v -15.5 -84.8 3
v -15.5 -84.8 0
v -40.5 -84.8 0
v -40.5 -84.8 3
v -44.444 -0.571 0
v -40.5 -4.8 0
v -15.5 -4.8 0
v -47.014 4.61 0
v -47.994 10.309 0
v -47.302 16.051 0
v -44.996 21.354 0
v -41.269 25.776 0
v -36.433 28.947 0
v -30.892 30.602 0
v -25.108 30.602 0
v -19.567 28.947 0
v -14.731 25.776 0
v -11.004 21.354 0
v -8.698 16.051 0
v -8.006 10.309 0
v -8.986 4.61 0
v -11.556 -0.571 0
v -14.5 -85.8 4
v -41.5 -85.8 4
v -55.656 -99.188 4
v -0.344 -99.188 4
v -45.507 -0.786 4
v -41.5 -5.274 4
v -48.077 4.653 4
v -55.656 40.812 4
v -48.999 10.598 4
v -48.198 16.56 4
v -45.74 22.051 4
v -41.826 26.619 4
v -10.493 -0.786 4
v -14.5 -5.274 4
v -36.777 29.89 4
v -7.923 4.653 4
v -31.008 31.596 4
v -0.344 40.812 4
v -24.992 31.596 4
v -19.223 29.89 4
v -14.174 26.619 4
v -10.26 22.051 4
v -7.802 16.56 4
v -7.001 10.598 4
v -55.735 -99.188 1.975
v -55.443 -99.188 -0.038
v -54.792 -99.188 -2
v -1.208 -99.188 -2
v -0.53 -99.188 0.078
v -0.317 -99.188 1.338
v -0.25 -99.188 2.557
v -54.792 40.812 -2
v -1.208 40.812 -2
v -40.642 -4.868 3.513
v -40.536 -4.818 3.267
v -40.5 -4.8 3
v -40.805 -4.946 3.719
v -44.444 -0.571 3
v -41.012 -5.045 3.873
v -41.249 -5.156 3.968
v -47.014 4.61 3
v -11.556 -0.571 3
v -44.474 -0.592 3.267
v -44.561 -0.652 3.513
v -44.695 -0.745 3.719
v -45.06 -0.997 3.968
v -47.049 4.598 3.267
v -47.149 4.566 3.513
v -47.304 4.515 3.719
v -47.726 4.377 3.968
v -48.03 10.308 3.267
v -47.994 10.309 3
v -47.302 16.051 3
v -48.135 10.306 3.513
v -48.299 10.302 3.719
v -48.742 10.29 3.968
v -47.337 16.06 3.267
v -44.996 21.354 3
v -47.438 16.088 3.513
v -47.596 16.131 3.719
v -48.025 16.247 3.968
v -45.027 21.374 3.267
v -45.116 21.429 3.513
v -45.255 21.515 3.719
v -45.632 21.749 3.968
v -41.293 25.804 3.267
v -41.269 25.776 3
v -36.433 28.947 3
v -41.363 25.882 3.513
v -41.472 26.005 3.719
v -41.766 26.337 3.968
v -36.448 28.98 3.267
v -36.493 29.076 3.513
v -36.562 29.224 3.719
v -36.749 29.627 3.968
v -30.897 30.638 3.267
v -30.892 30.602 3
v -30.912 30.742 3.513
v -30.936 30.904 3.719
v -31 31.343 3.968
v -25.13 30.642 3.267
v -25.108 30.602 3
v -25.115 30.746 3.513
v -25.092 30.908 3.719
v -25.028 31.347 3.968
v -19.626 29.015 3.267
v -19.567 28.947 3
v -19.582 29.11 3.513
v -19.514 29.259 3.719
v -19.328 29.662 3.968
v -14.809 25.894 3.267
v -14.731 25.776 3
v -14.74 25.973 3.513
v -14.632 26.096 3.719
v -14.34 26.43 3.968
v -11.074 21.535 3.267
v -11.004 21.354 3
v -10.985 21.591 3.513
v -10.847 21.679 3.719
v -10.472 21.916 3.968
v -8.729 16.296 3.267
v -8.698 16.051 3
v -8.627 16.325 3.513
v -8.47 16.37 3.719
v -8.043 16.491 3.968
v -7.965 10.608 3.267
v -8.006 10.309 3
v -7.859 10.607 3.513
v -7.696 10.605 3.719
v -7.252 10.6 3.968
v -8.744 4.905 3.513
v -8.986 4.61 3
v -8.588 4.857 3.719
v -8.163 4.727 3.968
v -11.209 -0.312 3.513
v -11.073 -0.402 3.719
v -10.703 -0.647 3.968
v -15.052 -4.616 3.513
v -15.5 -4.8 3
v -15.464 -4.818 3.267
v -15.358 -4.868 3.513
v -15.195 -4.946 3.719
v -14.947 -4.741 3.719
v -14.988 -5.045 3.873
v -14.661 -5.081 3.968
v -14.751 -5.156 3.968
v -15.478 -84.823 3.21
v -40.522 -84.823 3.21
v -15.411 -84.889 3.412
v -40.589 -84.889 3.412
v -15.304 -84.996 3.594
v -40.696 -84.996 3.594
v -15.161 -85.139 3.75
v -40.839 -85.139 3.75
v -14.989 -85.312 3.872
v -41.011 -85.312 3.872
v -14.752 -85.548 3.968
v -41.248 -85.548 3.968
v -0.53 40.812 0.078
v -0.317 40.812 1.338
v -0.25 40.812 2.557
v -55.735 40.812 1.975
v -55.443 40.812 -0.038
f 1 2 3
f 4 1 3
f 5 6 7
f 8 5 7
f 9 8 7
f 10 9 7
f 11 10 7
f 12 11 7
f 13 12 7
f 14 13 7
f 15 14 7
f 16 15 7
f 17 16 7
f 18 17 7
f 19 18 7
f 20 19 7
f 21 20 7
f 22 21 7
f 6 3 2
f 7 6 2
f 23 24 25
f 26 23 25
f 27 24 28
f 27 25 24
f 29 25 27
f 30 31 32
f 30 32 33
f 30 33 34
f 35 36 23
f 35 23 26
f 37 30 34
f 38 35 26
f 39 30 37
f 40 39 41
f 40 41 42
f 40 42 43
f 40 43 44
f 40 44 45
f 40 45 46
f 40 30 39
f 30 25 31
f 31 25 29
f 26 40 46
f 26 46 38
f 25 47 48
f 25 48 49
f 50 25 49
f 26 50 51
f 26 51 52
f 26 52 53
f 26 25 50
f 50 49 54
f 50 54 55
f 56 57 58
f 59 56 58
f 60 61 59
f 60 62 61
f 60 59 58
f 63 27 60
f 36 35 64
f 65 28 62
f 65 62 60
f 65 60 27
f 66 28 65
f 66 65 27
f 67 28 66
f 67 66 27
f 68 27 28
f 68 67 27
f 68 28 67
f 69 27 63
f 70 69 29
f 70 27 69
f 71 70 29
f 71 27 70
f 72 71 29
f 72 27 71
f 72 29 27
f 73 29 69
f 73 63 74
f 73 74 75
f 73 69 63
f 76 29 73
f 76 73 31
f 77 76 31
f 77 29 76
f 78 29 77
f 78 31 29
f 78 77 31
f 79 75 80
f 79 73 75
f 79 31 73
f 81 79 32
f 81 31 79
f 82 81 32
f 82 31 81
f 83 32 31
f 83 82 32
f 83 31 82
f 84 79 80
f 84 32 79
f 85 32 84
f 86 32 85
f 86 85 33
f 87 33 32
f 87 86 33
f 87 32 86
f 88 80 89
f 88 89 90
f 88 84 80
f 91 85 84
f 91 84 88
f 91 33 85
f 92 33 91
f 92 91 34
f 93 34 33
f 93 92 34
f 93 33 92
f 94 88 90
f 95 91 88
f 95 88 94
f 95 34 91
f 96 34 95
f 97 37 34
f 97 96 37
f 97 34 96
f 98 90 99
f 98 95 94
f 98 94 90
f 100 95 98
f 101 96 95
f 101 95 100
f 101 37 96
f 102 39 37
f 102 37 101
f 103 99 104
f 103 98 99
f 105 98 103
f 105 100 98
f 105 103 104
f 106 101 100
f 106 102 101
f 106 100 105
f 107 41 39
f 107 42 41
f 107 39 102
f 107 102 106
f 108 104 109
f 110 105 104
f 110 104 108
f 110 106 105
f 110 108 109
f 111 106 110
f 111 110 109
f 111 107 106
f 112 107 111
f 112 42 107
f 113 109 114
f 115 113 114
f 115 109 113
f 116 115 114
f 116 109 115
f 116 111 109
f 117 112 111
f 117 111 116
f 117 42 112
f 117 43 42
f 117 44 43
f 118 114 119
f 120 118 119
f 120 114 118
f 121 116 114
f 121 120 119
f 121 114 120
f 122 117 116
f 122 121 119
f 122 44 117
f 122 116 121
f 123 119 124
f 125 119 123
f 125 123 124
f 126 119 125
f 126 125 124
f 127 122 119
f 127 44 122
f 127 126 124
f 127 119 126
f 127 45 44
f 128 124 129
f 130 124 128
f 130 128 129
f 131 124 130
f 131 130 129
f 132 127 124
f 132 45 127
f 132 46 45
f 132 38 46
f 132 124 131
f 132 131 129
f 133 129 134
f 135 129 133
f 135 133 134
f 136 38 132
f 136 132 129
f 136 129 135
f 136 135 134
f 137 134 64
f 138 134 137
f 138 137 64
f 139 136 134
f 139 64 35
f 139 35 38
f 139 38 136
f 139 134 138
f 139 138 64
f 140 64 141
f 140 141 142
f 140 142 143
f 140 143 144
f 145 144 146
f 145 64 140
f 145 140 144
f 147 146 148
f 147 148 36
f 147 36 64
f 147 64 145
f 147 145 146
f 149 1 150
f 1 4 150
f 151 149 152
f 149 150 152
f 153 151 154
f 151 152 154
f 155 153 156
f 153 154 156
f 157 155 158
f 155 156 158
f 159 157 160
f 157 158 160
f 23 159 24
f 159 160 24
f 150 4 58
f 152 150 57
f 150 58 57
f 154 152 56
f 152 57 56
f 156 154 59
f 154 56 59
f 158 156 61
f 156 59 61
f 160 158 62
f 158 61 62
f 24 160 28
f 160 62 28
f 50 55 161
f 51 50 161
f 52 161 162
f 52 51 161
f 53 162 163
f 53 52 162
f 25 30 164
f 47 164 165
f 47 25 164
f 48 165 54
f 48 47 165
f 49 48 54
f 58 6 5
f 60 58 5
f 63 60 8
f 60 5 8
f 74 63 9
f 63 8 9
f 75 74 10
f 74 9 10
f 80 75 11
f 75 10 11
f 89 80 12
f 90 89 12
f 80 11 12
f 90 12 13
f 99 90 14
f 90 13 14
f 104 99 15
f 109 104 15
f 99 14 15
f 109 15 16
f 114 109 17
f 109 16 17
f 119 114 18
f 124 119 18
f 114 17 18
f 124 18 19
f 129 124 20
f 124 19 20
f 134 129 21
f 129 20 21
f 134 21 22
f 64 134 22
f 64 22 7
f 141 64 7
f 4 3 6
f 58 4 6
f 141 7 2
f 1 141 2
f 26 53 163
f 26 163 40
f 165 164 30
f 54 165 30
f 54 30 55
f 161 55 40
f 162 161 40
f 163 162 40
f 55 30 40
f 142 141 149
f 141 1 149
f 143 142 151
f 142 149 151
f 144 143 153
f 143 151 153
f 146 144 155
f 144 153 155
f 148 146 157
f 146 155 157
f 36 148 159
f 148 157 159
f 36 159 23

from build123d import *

# Parameters (mm, degrees)
F0_W     = 56
F0_H     = 140
F1_DEPTH = 4
F2_R     = 1
F3_W     = 56
F3_H     = 140
F4_DEPTH = 2
F6_DEPTH = 140


with BuildPart() as f1:
    # F0 (on Top) → F1 (new body)
    with BuildSketch(Plane.XY):
        with Locations((-28, -29.1878056526)):
            Rectangle(F0_W, F0_H)
        with BuildLine():
            ThreePointArc((-40.5, -4.8003006486), (-36.6602540378, 28.8399507247), (-8, 10.8121943474))
            ThreePointArc((-8, 10.8121943474), (-9.9722436227, 2.1519403095), (-15.5, -4.8003006486))
            Line((-15.5, -4.8003006486), (-15.5, -84.8003006486))
            Line((-15.5, -84.8003006486), (-40.5, -84.8003006486))
            Line((-40.5, -84.8003006486), (-40.5, -4.8003006486))
        make_face(mode=Mode.SUBTRACT)
    extrude(amount=F1_DEPTH)

    # F2
    f2_edges = [f1.edges().sort_by_distance(p)[0] for p in [
        (-36.660254, 28.839951, 4),
        (-28, -84.800301, 4),
        (-15.5, -44.800301, 4),
        (-40.5, -44.800301, 4),
    ]]
    fillet(f2_edges, radius=F2_R)

    # F3 (on face) → F4 (join)
    with BuildSketch(Plane(origin=(0, 0, 0), x_dir=(1, 0, 0), z_dir=(0, 0, -1))):
        with Locations((-28, 29.1878056526)):
            Rectangle(F3_W, F3_H)
    extrude(amount=F4_DEPTH)

    # F5 (on face) → F6 (cut)
    with BuildSketch(Plane.XZ.offset(99.1878056526)):
        with BuildLine():
            add(Edge.make_bspline(
                [(4.7167868723, 1.2952466803), (4.7335338345, 1.1579142358), (4.7907207583, 2.8268265821), (4.728835521, 3.7590862588), (4.550137161, 5.5569466999), (4.0878044752, 7.5497423615), (3.1530424566, 9.8821218174), (1.9056722615, 12.054913232), (0.3839834487, 14.0800693463), (-1.3922671666, 15.945478196), (-3.0668308786, 17.3457564736), (-4.5378930711, 18.4083876952), (-5.6986449343, 19.1776471354), (-6.9073685817, 19.9017205855), (-8.5528252486, 20.8065850146), (-10.6587895739, 21.8007860687), (-13.3265373851, 22.8031570282), (-16.0969822522, 23.6248737674), (-18.9575149764, 24.2714809671), (-21.896584676, 24.7375795115), (-24.3854542149, 24.9604081638), (-26.4386175024, 25.0485260723), (-28, 25.0734073731), (-29.5613824976, 25.0485260723), (-31.6145457851, 24.9604081638), (-34.103415324, 24.7375795116), (-37.0424850236, 24.2714809668), (-39.9030177479, 23.6248737687), (-42.6734626148, 22.8031570233), (-45.3412104266, 21.800786086), (-47.4471747498, 20.8065849594), (-49.0926314231, 19.9017207566), (-50.3013550503, 19.1776465923), (-51.4621069901, 18.4083898446), (-52.9331688432, 17.3457467095), (-54.607734032, 15.9455202527), (-56.3839785969, 14.0798990975), (-57.9056901102, 12.0555395434), (-59.1529762673, 9.8797992317), (-60.0880420615, 7.5580792781), (-60.5493701757, 5.5300331488), (-60.7312339418, 3.8432469623), (-60.7830452324, 2.5574920108), (-60.7312339418, 1.2717370592), (-60.5493701757, -0.4150491273), (-60.0880420615, -2.4430952566), (-59.1529762673, -4.7648152102), (-57.9056901102, -6.9405555219), (-56.3839785969, -8.964915076), (-54.607734032, -10.8305362311), (-52.9331688432, -12.230762688), (-51.4621069901, -13.2934058231), (-50.3013550503, -14.0626625708), (-49.0926314231, -14.7867367351), (-47.4471747498, -15.6916009379), (-45.3412104266, -16.6858020645), (-42.6734626148, -17.6881730018), (-39.9030177479, -18.5098897472), (-37.0424850236, -19.1564969452), (-34.103415324, -19.62259549), (-31.6145457851, -19.8454241422), (-29.5613824976, -19.9335420507), (-28, -19.9584233516), (-26.4386175024, -19.9335420507), (-24.3854542149, -19.8454241422), (-21.896584676, -19.6225954899), (-18.9575149764, -19.1564969456), (-16.0969822522, -18.5098897459), (-13.3265373851, -17.6881730067), (-10.6587895739, -16.6858020472), (-8.5528252486, -15.6916009931), (-6.9073685817, -14.786736564), (-5.6986449343, -14.0626631139), (-4.5378930711, -13.2934036737), (-3.0668308786, -12.2307724521), (-1.3922671666, -10.8304941745), (0.3839834487, -8.9650853248), (1.9056722615, -6.9399292104), (3.1530424566, -4.7671377959), (4.0878044752, -2.43475834), (4.550137161, -0.4419626784), (4.728835521, 1.3558977627), (4.7907207583, 2.2881574394), (4.6931123059, 5.1367098772), (4.6931123059, 1.4893885208), (4.7167868723, 1.2952466803)],
                knots=[0, 0, 0, 0, 0.0092598429, 0.0185196858, 0.0291851138, 0.041096994, 0.0541318454, 0.0671905669, 0.0803159225, 0.0935516852, 0.1057732622, 0.1168123825, 0.1264503427, 0.1361412644, 0.1473618238, 0.1599801884, 0.1739081794, 0.1879441959, 0.2020850355, 0.2163241554, 0.2294057764, 0.241151614, 0.2513573464, 0.2615630787, 0.2733089164, 0.2863905374, 0.3006296573, 0.3147704968, 0.3288065133, 0.3427345043, 0.3553528689, 0.3665734284, 0.3762643501, 0.3859023102, 0.3969414305, 0.4091630076, 0.4223987702, 0.4355241259, 0.4485828474, 0.4616176987, 0.4735295789, 0.4841950069, 0.4934548498, 0.5027146927, 0.5133801207, 0.525292001, 0.5383268523, 0.5513855738, 0.5645109294, 0.5777466921, 0.5899682692, 0.6010073895, 0.6106453496, 0.6203362713, 0.6315568307, 0.6441751953, 0.6581031863, 0.6721392029, 0.6862800424, 0.7005191623, 0.7136007833, 0.725346621, 0.7355523533, 0.7457580856, 0.7575039233, 0.7705855443, 0.7848246642, 0.7989655037, 0.8130015203, 0.8269295113, 0.8395478759, 0.8507684353, 0.860459357, 0.8700973171, 0.8811364374, 0.8933580145, 0.9065937771, 0.9197191328, 0.9327778543, 0.9458127056, 0.9577245858, 0.9683900139, 0.9776498568, 0.9869096997, 1, 1, 1, 1], degree=3))
        make_face()
        with BuildLine():
            add(Edge.make_bspline(
                [(-0.25, 2.5574920108), (-0.25, 32.8683811432), (-41.875, 17.712936577), (-83.5, 2.5574920108), (-41.875, -12.5979525555), (-0.25, -27.7533971217), (-0.25, 2.5574920108)],
                knots=[0, 0, 0, 2.0943951024, 2.0943951024, 4.1887902048, 4.1887902048, 6.2831853072, 6.2831853072, 6.2831853072], degree=2, weights=[1, 0.5, 1, 0.5, 1, 0.5, 1]))
        make_face(mode=Mode.SUBTRACT)
    extrude(amount=-F6_DEPTH, mode=Mode.SUBTRACT)


solid = f1.part
